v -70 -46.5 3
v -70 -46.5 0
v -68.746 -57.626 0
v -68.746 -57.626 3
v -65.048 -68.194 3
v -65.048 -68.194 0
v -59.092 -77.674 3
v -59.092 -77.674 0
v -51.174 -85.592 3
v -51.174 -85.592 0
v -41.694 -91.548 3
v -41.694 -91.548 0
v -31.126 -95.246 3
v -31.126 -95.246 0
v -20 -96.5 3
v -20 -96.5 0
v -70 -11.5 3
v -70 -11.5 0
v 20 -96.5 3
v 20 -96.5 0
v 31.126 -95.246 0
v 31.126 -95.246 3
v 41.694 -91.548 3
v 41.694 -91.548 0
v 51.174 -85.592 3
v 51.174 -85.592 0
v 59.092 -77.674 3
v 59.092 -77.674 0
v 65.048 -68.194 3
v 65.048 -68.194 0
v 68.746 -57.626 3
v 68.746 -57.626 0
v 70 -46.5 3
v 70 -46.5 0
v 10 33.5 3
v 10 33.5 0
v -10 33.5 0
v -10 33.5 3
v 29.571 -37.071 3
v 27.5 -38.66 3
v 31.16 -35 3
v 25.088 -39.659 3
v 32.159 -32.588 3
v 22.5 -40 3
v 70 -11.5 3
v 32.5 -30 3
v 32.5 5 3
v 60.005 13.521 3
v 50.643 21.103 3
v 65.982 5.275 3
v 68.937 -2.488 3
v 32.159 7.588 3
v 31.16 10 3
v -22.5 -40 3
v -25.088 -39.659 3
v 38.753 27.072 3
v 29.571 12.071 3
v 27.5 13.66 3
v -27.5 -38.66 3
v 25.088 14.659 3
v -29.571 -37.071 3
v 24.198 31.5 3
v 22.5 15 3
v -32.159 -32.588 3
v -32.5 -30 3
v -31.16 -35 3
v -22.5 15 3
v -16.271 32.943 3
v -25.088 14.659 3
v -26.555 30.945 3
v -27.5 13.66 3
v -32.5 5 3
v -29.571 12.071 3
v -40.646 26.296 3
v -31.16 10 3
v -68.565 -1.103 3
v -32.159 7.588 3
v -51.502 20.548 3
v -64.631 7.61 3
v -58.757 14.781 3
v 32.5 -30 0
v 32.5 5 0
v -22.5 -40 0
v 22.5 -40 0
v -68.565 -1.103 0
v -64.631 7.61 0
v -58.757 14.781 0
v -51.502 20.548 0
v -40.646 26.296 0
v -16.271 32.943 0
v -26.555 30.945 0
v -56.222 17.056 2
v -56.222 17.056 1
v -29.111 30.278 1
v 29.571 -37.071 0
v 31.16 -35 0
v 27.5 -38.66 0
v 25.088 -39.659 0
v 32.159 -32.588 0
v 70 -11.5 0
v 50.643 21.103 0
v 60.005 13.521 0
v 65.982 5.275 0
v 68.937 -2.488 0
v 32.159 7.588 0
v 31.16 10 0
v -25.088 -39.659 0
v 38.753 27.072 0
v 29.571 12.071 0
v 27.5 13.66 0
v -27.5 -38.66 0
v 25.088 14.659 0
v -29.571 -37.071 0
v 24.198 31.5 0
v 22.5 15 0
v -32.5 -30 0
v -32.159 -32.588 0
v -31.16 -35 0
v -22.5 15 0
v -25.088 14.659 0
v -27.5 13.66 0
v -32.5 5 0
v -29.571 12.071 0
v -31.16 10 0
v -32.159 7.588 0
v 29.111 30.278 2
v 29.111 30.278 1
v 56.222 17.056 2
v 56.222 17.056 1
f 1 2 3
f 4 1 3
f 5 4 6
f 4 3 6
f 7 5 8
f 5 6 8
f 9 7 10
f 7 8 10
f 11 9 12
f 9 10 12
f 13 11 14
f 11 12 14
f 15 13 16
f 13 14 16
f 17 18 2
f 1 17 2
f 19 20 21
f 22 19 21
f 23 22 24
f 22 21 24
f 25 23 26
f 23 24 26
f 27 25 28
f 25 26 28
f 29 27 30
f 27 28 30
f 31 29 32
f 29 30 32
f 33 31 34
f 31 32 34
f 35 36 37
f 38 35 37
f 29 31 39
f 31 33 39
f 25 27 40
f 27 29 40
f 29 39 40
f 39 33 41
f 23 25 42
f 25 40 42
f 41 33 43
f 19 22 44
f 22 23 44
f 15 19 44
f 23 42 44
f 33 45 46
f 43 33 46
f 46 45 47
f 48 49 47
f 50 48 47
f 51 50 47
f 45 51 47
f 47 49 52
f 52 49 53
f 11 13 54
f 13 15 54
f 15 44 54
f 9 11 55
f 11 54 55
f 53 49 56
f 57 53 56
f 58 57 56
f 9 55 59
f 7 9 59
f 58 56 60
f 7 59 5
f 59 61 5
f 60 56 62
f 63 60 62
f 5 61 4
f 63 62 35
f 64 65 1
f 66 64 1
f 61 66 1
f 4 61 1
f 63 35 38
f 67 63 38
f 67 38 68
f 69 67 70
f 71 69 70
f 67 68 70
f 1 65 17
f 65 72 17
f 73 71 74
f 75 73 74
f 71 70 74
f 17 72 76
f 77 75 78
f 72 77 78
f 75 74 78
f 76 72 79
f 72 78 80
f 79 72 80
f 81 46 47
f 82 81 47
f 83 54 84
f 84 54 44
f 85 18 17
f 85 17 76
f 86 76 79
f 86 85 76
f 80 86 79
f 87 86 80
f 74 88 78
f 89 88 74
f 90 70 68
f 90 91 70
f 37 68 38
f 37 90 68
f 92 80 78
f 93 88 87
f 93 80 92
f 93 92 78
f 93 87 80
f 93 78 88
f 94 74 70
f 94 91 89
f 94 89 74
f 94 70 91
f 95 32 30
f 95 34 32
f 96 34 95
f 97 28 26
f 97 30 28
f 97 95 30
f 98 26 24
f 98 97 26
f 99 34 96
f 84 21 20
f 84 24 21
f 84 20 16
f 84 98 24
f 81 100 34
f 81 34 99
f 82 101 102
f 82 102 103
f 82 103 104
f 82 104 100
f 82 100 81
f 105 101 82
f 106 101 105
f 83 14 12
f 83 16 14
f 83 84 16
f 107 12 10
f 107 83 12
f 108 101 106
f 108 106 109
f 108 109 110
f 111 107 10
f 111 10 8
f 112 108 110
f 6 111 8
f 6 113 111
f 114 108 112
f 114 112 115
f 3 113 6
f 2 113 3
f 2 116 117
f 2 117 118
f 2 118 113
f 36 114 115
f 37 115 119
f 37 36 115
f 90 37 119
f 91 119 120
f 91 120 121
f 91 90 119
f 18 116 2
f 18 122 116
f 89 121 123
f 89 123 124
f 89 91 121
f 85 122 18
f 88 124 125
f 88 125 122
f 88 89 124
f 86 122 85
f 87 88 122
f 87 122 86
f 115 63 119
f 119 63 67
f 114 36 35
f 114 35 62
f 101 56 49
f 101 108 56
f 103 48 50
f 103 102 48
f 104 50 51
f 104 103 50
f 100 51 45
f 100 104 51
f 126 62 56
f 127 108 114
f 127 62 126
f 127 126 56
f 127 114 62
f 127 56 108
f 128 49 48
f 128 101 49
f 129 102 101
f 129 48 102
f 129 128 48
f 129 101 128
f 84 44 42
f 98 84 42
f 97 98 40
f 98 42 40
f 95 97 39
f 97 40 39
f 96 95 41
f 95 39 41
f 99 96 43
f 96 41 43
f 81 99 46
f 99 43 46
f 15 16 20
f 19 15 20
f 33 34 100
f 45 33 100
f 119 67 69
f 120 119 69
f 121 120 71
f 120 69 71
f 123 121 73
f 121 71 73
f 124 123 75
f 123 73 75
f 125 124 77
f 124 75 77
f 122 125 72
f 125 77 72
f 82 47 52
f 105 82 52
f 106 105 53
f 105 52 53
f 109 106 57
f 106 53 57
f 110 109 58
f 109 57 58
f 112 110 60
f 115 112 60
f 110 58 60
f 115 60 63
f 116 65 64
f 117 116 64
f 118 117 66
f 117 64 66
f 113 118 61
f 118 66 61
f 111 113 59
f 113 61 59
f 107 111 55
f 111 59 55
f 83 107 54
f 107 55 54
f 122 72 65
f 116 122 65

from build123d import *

# Parameters (mm, degrees)
BOSS_EXTRUDE1_DEPTH = 3
CUT_EXTRUDE1_DEPTH  = 10


with BuildPart() as part:
    # Sketch1 → Boss-Extrude1 (new body)
    with BuildSketch(Plane.XY):
        with BuildLine():
            add(Edge.make_bspline(
                [(-70, -11.5), (-70, 26.5), (-18, 33.5), (-10, 33.5)],
                knots=[0, 0, 0, 0, 1, 1, 1, 1], degree=3))
            Line((-70, -11.5), (-70, -46.5))
            ThreePointArc((-70, -46.5), (-55.355339059, -81.855339059), (-20, -96.5))
            Line((-20, -96.5), (20, -96.5))
            ThreePointArc((20, -96.5), (55.355339059, -81.855339059), (70, -46.5))
            Line((70, -46.5), (70, -11.5))
            add(Edge.make_bspline(
                [(10, 33.5), (18, 33.5), (70, 26.5), (70, -11.5)],
                knots=[0, 0, 0, 0, 1, 1, 1, 1], degree=3))
            Line((10, 33.5), (-10, 33.5))
        make_face()
    extrude(amount=BOSS_EXTRUDE1_DEPTH)

    # Sketch2 → Cut-Extrude1 (cut)
    with BuildSketch(Plane.XY.offset(3)):
        with BuildLine():
            Line((-22.5, -40), (22.5, -40))
            ThreePointArc((22.5, -40), (29.571067812, -37.071067812), (32.5, -30))
            Line((32.5, -30), (32.5, 5))
            ThreePointArc((32.5, 5), (29.571067812, 12.071067812), (22.5, 15))
            Line((22.5, 15), (-22.5, 15))
            ThreePointArc((-22.5, 15), (-29.571067812, 12.071067812), (-32.5, 5))
            Line((-32.5, 5), (-32.5, -30))
            ThreePointArc((-32.5, -30), (-29.571067812, -37.071067812), (-22.5, -40))
        make_face()
    extrude(amount=-CUT_EXTRUDE1_DEPTH, mode=Mode.SUBTRACT)


solid = part.part
